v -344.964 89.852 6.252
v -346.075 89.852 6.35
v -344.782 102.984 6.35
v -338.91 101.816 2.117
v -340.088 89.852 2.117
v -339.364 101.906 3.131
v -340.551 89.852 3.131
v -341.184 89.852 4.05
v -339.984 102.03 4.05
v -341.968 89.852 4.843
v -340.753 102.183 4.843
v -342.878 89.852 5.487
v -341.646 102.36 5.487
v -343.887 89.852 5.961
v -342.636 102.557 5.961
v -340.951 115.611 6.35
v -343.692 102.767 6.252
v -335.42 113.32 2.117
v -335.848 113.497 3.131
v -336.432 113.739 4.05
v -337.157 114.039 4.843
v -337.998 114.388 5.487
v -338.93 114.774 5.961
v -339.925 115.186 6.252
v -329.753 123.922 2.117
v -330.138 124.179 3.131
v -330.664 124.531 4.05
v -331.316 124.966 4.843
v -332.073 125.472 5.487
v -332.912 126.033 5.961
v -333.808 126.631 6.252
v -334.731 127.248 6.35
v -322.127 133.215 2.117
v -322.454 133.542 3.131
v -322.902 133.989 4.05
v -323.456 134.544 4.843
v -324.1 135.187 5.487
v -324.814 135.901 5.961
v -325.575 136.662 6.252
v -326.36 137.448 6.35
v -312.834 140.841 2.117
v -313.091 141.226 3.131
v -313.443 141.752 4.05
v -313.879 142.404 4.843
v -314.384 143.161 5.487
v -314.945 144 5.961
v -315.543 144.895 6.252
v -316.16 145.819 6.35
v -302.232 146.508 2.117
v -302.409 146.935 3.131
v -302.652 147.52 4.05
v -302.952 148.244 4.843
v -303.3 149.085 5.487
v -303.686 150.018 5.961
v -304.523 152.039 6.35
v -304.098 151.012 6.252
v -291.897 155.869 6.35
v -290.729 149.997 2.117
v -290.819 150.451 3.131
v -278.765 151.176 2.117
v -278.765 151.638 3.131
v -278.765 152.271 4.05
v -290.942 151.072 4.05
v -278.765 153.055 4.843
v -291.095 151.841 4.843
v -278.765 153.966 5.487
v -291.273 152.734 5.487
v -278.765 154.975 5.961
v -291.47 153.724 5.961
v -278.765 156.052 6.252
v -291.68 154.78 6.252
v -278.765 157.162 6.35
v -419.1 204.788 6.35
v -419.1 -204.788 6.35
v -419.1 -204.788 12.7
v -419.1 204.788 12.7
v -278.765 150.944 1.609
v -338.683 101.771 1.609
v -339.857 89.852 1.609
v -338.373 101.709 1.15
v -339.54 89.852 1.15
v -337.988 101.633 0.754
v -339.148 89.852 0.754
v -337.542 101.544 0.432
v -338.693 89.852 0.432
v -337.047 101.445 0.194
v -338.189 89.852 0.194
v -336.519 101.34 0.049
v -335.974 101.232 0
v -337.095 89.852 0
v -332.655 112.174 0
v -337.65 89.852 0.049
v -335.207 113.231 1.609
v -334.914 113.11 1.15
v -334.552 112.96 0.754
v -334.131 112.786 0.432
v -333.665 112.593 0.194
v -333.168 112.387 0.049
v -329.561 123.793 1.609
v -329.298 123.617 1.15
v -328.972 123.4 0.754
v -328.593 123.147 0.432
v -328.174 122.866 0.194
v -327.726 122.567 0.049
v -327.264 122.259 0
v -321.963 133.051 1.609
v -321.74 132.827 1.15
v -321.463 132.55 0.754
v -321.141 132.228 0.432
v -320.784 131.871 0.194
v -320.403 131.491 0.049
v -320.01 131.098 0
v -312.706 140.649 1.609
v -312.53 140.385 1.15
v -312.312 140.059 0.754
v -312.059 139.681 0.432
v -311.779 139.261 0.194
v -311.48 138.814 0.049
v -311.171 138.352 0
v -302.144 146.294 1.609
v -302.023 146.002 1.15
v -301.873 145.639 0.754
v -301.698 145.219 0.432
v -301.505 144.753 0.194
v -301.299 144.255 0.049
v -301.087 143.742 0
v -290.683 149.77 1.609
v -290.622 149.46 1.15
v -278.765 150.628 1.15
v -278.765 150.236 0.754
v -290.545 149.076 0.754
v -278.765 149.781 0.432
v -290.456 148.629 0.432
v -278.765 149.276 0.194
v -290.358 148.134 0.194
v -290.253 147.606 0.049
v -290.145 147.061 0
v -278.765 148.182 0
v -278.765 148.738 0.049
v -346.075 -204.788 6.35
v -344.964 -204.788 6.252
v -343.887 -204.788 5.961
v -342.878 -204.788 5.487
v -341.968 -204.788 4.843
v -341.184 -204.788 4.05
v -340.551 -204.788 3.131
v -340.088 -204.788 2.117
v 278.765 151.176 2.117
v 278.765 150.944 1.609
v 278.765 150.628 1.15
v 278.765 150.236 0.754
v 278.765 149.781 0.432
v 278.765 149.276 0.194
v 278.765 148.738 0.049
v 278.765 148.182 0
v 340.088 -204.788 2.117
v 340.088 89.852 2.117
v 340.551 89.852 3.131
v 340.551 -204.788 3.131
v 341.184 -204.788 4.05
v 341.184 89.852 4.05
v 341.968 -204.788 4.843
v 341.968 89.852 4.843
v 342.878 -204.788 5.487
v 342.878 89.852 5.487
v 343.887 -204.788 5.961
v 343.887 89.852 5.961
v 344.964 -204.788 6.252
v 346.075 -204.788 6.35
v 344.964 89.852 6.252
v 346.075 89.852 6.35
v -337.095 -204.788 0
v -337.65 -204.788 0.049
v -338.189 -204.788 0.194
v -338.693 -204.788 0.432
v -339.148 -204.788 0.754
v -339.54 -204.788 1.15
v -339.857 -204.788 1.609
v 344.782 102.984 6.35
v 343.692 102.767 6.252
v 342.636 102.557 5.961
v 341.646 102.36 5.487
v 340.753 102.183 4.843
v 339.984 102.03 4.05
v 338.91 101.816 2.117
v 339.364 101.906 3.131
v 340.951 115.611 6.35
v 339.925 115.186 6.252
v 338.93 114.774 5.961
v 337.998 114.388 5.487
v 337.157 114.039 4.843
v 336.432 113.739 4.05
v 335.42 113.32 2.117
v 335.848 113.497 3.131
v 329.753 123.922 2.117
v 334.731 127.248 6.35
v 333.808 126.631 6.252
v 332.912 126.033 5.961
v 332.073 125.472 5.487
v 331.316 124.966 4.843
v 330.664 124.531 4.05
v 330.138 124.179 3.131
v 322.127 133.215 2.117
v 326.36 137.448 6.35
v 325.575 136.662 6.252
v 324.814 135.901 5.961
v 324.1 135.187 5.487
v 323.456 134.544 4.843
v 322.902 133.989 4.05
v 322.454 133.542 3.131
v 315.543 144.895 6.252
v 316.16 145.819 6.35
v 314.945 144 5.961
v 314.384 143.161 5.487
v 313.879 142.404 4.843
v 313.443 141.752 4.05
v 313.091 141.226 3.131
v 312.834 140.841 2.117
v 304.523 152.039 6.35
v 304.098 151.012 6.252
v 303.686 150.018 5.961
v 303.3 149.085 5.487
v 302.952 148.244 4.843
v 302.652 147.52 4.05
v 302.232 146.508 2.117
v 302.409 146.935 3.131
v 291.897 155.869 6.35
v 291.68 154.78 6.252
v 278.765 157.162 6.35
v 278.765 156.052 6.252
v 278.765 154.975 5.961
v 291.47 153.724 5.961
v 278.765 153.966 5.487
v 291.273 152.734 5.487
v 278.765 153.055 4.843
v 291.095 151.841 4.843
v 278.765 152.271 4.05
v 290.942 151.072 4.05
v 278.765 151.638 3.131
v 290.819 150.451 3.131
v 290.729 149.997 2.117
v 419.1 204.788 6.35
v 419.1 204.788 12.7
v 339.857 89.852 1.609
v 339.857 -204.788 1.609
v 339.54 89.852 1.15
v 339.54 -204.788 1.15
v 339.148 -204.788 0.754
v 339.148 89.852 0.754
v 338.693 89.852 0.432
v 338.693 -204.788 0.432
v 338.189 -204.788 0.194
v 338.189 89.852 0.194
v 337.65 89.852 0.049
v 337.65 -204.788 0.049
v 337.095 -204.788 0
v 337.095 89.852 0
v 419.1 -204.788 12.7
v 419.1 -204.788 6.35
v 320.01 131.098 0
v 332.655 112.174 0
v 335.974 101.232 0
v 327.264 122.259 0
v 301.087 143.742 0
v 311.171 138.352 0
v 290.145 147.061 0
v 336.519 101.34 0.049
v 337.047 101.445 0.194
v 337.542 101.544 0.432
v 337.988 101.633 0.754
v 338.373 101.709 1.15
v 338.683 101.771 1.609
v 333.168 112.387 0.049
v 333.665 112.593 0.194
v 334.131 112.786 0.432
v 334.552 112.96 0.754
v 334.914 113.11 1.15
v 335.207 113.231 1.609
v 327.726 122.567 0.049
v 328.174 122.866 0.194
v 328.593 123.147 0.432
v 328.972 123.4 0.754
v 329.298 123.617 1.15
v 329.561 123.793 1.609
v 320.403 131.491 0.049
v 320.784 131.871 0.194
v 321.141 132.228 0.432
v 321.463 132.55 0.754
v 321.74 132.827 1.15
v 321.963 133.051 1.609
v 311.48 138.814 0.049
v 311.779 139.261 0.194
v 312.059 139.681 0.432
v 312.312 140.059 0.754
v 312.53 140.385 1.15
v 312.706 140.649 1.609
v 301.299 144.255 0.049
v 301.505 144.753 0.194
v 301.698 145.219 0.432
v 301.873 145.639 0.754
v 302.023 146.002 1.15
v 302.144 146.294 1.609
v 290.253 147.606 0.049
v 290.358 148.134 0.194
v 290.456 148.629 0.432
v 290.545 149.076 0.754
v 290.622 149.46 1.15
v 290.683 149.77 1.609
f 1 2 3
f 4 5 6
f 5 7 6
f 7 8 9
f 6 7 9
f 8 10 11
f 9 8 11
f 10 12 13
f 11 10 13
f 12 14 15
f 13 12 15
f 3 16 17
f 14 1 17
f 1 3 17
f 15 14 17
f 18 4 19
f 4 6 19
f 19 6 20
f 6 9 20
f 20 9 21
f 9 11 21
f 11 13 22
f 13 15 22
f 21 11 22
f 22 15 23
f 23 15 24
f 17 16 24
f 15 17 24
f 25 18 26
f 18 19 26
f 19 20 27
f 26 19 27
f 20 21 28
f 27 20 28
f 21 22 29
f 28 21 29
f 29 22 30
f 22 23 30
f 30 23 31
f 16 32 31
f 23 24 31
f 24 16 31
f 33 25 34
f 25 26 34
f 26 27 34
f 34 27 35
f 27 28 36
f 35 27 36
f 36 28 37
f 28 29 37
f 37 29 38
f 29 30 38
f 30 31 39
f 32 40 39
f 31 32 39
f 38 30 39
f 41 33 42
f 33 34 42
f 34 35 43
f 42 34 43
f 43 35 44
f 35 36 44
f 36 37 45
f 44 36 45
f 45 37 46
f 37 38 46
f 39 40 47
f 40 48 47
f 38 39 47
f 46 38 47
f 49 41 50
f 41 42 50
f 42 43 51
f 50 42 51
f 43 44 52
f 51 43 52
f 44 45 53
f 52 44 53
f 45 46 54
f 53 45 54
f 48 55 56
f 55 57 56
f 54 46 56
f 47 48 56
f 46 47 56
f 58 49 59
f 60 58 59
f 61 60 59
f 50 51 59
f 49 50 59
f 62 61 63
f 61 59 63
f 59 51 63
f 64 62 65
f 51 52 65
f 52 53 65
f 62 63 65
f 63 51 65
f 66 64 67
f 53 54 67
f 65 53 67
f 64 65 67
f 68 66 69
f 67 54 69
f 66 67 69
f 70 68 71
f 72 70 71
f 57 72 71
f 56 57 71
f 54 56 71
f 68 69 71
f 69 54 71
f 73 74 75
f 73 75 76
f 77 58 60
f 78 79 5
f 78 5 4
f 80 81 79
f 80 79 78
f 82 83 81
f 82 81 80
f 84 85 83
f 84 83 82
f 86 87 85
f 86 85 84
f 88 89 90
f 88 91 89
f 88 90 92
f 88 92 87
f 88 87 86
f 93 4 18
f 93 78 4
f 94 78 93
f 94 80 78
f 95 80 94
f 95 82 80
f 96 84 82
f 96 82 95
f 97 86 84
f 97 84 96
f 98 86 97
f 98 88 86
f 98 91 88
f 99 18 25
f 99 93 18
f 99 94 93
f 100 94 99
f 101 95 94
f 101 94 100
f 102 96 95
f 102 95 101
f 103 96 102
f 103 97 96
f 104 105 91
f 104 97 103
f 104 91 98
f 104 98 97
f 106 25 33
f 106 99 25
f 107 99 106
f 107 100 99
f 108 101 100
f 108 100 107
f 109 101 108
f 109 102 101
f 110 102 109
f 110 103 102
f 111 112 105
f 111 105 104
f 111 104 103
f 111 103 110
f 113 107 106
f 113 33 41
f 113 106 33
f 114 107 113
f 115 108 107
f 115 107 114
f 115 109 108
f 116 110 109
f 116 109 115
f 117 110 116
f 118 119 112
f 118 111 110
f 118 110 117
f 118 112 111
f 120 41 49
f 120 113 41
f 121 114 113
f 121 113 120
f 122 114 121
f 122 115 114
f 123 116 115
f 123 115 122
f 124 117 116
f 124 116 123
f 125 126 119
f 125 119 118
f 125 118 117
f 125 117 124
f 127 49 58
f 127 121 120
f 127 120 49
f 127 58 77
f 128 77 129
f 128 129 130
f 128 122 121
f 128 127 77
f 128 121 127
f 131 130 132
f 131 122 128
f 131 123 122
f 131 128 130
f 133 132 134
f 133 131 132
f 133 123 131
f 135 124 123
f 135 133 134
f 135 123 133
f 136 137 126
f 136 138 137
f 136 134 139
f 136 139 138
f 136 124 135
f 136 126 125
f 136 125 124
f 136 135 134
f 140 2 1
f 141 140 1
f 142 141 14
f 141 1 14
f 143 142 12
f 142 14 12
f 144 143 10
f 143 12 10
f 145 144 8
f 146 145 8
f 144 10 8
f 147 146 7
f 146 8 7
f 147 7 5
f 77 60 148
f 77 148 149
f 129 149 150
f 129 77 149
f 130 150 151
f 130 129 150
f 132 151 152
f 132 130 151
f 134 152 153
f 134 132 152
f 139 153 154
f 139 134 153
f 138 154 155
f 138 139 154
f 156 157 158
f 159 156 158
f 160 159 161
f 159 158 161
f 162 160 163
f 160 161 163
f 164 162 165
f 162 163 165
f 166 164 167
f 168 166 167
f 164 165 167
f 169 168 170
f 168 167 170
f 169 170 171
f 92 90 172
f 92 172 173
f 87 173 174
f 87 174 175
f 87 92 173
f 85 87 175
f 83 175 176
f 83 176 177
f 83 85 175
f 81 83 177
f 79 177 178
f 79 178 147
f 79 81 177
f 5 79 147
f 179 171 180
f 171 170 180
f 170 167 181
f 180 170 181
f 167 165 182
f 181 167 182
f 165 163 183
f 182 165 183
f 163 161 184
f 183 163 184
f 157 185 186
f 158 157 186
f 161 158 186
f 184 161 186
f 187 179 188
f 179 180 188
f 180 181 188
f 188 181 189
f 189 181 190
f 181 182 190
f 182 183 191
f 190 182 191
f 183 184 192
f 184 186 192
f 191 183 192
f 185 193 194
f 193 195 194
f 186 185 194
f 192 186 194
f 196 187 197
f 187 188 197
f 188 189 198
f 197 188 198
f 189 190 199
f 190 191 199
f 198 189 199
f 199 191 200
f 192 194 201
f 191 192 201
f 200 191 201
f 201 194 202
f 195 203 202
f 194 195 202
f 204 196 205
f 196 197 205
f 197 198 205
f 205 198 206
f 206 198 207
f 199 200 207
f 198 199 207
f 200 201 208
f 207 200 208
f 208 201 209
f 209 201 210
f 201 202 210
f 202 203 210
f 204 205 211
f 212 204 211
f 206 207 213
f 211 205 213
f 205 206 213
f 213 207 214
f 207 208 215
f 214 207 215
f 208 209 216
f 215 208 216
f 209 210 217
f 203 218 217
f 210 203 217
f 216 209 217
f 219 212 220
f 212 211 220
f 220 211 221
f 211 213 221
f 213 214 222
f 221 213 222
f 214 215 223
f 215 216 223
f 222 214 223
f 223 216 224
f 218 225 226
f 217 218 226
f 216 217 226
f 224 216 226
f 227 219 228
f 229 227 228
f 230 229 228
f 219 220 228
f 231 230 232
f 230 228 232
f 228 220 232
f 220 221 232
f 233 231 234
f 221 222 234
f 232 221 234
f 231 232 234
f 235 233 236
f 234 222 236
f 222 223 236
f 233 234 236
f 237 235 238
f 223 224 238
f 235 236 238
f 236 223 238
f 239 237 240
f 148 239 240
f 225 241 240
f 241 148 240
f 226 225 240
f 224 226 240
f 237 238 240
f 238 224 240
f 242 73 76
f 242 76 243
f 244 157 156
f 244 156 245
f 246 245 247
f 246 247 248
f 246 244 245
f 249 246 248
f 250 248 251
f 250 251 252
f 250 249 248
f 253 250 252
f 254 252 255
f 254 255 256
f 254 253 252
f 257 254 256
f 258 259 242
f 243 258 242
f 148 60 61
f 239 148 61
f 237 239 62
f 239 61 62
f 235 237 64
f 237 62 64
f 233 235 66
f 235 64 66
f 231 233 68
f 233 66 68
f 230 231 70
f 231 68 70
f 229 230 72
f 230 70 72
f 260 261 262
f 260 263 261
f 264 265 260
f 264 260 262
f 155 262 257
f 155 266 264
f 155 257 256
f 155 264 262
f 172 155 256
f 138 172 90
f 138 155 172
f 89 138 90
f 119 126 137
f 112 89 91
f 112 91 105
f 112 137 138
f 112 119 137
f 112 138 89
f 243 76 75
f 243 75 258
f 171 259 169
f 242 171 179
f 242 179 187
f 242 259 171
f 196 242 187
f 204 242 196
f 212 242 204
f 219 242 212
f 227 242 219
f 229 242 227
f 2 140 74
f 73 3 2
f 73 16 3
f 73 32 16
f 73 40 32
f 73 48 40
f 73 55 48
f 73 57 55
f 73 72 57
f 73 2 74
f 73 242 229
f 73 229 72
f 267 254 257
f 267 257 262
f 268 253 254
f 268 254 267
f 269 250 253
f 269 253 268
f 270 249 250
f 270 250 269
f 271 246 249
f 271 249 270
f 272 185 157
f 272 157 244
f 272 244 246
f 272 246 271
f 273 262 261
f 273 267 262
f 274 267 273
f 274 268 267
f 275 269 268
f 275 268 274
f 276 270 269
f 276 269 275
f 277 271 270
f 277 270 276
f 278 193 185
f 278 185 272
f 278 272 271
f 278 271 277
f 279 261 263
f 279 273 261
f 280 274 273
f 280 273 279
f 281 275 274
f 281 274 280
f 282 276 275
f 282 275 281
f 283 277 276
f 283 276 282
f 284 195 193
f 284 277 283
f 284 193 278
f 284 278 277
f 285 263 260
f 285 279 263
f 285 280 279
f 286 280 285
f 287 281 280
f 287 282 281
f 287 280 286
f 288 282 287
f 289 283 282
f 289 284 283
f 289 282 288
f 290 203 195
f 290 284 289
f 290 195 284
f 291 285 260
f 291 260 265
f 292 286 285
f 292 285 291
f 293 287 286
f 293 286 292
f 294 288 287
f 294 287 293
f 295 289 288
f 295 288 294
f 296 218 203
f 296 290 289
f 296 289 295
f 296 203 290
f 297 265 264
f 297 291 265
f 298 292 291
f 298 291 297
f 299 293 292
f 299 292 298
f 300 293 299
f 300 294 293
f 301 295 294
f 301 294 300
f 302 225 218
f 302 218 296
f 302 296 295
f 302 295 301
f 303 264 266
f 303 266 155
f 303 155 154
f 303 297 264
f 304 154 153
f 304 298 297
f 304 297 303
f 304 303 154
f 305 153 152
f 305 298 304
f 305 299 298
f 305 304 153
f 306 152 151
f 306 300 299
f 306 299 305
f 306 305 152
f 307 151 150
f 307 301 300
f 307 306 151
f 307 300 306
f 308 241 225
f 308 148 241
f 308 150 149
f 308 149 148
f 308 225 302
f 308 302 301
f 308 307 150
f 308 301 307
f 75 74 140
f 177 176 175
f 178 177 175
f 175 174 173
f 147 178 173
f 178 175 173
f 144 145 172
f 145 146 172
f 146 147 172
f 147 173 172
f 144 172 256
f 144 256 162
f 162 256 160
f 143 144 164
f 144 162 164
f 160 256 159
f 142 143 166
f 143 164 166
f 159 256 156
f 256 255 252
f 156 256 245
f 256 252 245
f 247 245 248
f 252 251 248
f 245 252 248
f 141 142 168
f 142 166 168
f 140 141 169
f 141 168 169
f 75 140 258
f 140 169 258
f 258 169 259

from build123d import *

# Parameters (mm, degrees)
F0_W     = 838.2
F0_H     = 409.575
F1_DEPTH = 12.7
F7_DEPTH = 6.35


with BuildPart() as f1:
    # F0 (on Top) → F1 (new body)
    with BuildSketch(Plane.XY):
        Rectangle(F0_W, F0_H)
    extrude(amount=F1_DEPTH)

    # F4: sweep along a path in F2
    with BuildLine(Plane(origin=(0, 0, 0), x_dir=(1, 0, 0), z_dir=(0, 0, -1))) as f4_path:
        Line((339.725, 204.7875), (339.725, -89.8525))
        ThreePointArc((339.725, -89.8525), (321.8702293811, -132.9577293811), (278.765, -150.8125))
        Line((278.765, -150.8125), (-278.765, -150.8125))
    # F3 (on face) → F4 (sweep, cut)
    with BuildSketch(Plane.XZ.offset(204.7875)):
        with BuildLine():
            Line((419.1, 0), (419.1, 6.35))
            Line((419.1, 6.35), (346.075, 6.35))
            ThreePointArc((346.075, 6.35), (342.4088257906, 5.1847532889), (340.088162586, 2.1166666667))
            ThreePointArc((340.088162586, 2.1166666667), (338.9278309836, 0.5826233556), (337.0947438789, 0))
            Line((337.0947438789, 0), (419.1, 0))
        make_face()
        Polygon((419.1, -8.3515942097), (419.1, 0), (337.0947438789, 0), (334.0992927551, 0), (334.0992927551, -8.3515942097), align=None)
    sweep(path=f4_path.line, mode=Mode.SUBTRACT)

    # F5: sweep along a path in F2
    with BuildLine(Plane(origin=(0, 0, 0), x_dir=(1, 0, 0), z_dir=(0, 0, -1))) as f5_path:
        Line((-339.725, 204.7875), (-339.725, -89.8525))
        ThreePointArc((-339.725, -89.8525), (-321.8702293811, -132.9577293811), (-278.765, -150.8125))
    # F3 (on face) → F5 (sweep, cut)
    with BuildSketch(Plane.XZ.offset(204.7875)):
        Polygon((-334.0992927551, -8.3515942097), (-334.0992927551, 0), (-337.0947438789, 0), (-419.1, 0), (-419.1, -8.3515942097), align=None)
        with BuildLine():
            Line((-346.075, 6.35), (-419.1, 6.35))
            Line((-419.1, 6.35), (-419.1, 0))
            Line((-419.1, 0), (-337.0947438789, 0))
            ThreePointArc((-337.0947438789, 0), (-338.9278309836, 0.5826233556), (-340.088162586, 2.1166666667))
            ThreePointArc((-340.088162586, 2.1166666667), (-342.4088257906, 5.1847532889), (-346.075, 6.35))
        make_face()
    sweep(path=f5_path.line, mode=Mode.SUBTRACT)

    # F6 (on face) → F7 (cut)
    with BuildSketch(Plane(origin=(0, 0, 0), x_dir=(1, 0, 0), z_dir=(0, 0, -1))):
        Polygon((-393.2344317436, -48.8721951842), (-452.7488350868, -48.8721951842), (-471.2188243866, -238.360658288), (-328.9314508438, -230.1517724991), align=None)
        Polygon((437.9153549671, 9.2740878463), (311.3617002964, -234.2562228441), (450.2286911011, -257.5147151947), align=None)
    extrude(amount=-F7_DEPTH, mode=Mode.SUBTRACT)


solid = f1.part
